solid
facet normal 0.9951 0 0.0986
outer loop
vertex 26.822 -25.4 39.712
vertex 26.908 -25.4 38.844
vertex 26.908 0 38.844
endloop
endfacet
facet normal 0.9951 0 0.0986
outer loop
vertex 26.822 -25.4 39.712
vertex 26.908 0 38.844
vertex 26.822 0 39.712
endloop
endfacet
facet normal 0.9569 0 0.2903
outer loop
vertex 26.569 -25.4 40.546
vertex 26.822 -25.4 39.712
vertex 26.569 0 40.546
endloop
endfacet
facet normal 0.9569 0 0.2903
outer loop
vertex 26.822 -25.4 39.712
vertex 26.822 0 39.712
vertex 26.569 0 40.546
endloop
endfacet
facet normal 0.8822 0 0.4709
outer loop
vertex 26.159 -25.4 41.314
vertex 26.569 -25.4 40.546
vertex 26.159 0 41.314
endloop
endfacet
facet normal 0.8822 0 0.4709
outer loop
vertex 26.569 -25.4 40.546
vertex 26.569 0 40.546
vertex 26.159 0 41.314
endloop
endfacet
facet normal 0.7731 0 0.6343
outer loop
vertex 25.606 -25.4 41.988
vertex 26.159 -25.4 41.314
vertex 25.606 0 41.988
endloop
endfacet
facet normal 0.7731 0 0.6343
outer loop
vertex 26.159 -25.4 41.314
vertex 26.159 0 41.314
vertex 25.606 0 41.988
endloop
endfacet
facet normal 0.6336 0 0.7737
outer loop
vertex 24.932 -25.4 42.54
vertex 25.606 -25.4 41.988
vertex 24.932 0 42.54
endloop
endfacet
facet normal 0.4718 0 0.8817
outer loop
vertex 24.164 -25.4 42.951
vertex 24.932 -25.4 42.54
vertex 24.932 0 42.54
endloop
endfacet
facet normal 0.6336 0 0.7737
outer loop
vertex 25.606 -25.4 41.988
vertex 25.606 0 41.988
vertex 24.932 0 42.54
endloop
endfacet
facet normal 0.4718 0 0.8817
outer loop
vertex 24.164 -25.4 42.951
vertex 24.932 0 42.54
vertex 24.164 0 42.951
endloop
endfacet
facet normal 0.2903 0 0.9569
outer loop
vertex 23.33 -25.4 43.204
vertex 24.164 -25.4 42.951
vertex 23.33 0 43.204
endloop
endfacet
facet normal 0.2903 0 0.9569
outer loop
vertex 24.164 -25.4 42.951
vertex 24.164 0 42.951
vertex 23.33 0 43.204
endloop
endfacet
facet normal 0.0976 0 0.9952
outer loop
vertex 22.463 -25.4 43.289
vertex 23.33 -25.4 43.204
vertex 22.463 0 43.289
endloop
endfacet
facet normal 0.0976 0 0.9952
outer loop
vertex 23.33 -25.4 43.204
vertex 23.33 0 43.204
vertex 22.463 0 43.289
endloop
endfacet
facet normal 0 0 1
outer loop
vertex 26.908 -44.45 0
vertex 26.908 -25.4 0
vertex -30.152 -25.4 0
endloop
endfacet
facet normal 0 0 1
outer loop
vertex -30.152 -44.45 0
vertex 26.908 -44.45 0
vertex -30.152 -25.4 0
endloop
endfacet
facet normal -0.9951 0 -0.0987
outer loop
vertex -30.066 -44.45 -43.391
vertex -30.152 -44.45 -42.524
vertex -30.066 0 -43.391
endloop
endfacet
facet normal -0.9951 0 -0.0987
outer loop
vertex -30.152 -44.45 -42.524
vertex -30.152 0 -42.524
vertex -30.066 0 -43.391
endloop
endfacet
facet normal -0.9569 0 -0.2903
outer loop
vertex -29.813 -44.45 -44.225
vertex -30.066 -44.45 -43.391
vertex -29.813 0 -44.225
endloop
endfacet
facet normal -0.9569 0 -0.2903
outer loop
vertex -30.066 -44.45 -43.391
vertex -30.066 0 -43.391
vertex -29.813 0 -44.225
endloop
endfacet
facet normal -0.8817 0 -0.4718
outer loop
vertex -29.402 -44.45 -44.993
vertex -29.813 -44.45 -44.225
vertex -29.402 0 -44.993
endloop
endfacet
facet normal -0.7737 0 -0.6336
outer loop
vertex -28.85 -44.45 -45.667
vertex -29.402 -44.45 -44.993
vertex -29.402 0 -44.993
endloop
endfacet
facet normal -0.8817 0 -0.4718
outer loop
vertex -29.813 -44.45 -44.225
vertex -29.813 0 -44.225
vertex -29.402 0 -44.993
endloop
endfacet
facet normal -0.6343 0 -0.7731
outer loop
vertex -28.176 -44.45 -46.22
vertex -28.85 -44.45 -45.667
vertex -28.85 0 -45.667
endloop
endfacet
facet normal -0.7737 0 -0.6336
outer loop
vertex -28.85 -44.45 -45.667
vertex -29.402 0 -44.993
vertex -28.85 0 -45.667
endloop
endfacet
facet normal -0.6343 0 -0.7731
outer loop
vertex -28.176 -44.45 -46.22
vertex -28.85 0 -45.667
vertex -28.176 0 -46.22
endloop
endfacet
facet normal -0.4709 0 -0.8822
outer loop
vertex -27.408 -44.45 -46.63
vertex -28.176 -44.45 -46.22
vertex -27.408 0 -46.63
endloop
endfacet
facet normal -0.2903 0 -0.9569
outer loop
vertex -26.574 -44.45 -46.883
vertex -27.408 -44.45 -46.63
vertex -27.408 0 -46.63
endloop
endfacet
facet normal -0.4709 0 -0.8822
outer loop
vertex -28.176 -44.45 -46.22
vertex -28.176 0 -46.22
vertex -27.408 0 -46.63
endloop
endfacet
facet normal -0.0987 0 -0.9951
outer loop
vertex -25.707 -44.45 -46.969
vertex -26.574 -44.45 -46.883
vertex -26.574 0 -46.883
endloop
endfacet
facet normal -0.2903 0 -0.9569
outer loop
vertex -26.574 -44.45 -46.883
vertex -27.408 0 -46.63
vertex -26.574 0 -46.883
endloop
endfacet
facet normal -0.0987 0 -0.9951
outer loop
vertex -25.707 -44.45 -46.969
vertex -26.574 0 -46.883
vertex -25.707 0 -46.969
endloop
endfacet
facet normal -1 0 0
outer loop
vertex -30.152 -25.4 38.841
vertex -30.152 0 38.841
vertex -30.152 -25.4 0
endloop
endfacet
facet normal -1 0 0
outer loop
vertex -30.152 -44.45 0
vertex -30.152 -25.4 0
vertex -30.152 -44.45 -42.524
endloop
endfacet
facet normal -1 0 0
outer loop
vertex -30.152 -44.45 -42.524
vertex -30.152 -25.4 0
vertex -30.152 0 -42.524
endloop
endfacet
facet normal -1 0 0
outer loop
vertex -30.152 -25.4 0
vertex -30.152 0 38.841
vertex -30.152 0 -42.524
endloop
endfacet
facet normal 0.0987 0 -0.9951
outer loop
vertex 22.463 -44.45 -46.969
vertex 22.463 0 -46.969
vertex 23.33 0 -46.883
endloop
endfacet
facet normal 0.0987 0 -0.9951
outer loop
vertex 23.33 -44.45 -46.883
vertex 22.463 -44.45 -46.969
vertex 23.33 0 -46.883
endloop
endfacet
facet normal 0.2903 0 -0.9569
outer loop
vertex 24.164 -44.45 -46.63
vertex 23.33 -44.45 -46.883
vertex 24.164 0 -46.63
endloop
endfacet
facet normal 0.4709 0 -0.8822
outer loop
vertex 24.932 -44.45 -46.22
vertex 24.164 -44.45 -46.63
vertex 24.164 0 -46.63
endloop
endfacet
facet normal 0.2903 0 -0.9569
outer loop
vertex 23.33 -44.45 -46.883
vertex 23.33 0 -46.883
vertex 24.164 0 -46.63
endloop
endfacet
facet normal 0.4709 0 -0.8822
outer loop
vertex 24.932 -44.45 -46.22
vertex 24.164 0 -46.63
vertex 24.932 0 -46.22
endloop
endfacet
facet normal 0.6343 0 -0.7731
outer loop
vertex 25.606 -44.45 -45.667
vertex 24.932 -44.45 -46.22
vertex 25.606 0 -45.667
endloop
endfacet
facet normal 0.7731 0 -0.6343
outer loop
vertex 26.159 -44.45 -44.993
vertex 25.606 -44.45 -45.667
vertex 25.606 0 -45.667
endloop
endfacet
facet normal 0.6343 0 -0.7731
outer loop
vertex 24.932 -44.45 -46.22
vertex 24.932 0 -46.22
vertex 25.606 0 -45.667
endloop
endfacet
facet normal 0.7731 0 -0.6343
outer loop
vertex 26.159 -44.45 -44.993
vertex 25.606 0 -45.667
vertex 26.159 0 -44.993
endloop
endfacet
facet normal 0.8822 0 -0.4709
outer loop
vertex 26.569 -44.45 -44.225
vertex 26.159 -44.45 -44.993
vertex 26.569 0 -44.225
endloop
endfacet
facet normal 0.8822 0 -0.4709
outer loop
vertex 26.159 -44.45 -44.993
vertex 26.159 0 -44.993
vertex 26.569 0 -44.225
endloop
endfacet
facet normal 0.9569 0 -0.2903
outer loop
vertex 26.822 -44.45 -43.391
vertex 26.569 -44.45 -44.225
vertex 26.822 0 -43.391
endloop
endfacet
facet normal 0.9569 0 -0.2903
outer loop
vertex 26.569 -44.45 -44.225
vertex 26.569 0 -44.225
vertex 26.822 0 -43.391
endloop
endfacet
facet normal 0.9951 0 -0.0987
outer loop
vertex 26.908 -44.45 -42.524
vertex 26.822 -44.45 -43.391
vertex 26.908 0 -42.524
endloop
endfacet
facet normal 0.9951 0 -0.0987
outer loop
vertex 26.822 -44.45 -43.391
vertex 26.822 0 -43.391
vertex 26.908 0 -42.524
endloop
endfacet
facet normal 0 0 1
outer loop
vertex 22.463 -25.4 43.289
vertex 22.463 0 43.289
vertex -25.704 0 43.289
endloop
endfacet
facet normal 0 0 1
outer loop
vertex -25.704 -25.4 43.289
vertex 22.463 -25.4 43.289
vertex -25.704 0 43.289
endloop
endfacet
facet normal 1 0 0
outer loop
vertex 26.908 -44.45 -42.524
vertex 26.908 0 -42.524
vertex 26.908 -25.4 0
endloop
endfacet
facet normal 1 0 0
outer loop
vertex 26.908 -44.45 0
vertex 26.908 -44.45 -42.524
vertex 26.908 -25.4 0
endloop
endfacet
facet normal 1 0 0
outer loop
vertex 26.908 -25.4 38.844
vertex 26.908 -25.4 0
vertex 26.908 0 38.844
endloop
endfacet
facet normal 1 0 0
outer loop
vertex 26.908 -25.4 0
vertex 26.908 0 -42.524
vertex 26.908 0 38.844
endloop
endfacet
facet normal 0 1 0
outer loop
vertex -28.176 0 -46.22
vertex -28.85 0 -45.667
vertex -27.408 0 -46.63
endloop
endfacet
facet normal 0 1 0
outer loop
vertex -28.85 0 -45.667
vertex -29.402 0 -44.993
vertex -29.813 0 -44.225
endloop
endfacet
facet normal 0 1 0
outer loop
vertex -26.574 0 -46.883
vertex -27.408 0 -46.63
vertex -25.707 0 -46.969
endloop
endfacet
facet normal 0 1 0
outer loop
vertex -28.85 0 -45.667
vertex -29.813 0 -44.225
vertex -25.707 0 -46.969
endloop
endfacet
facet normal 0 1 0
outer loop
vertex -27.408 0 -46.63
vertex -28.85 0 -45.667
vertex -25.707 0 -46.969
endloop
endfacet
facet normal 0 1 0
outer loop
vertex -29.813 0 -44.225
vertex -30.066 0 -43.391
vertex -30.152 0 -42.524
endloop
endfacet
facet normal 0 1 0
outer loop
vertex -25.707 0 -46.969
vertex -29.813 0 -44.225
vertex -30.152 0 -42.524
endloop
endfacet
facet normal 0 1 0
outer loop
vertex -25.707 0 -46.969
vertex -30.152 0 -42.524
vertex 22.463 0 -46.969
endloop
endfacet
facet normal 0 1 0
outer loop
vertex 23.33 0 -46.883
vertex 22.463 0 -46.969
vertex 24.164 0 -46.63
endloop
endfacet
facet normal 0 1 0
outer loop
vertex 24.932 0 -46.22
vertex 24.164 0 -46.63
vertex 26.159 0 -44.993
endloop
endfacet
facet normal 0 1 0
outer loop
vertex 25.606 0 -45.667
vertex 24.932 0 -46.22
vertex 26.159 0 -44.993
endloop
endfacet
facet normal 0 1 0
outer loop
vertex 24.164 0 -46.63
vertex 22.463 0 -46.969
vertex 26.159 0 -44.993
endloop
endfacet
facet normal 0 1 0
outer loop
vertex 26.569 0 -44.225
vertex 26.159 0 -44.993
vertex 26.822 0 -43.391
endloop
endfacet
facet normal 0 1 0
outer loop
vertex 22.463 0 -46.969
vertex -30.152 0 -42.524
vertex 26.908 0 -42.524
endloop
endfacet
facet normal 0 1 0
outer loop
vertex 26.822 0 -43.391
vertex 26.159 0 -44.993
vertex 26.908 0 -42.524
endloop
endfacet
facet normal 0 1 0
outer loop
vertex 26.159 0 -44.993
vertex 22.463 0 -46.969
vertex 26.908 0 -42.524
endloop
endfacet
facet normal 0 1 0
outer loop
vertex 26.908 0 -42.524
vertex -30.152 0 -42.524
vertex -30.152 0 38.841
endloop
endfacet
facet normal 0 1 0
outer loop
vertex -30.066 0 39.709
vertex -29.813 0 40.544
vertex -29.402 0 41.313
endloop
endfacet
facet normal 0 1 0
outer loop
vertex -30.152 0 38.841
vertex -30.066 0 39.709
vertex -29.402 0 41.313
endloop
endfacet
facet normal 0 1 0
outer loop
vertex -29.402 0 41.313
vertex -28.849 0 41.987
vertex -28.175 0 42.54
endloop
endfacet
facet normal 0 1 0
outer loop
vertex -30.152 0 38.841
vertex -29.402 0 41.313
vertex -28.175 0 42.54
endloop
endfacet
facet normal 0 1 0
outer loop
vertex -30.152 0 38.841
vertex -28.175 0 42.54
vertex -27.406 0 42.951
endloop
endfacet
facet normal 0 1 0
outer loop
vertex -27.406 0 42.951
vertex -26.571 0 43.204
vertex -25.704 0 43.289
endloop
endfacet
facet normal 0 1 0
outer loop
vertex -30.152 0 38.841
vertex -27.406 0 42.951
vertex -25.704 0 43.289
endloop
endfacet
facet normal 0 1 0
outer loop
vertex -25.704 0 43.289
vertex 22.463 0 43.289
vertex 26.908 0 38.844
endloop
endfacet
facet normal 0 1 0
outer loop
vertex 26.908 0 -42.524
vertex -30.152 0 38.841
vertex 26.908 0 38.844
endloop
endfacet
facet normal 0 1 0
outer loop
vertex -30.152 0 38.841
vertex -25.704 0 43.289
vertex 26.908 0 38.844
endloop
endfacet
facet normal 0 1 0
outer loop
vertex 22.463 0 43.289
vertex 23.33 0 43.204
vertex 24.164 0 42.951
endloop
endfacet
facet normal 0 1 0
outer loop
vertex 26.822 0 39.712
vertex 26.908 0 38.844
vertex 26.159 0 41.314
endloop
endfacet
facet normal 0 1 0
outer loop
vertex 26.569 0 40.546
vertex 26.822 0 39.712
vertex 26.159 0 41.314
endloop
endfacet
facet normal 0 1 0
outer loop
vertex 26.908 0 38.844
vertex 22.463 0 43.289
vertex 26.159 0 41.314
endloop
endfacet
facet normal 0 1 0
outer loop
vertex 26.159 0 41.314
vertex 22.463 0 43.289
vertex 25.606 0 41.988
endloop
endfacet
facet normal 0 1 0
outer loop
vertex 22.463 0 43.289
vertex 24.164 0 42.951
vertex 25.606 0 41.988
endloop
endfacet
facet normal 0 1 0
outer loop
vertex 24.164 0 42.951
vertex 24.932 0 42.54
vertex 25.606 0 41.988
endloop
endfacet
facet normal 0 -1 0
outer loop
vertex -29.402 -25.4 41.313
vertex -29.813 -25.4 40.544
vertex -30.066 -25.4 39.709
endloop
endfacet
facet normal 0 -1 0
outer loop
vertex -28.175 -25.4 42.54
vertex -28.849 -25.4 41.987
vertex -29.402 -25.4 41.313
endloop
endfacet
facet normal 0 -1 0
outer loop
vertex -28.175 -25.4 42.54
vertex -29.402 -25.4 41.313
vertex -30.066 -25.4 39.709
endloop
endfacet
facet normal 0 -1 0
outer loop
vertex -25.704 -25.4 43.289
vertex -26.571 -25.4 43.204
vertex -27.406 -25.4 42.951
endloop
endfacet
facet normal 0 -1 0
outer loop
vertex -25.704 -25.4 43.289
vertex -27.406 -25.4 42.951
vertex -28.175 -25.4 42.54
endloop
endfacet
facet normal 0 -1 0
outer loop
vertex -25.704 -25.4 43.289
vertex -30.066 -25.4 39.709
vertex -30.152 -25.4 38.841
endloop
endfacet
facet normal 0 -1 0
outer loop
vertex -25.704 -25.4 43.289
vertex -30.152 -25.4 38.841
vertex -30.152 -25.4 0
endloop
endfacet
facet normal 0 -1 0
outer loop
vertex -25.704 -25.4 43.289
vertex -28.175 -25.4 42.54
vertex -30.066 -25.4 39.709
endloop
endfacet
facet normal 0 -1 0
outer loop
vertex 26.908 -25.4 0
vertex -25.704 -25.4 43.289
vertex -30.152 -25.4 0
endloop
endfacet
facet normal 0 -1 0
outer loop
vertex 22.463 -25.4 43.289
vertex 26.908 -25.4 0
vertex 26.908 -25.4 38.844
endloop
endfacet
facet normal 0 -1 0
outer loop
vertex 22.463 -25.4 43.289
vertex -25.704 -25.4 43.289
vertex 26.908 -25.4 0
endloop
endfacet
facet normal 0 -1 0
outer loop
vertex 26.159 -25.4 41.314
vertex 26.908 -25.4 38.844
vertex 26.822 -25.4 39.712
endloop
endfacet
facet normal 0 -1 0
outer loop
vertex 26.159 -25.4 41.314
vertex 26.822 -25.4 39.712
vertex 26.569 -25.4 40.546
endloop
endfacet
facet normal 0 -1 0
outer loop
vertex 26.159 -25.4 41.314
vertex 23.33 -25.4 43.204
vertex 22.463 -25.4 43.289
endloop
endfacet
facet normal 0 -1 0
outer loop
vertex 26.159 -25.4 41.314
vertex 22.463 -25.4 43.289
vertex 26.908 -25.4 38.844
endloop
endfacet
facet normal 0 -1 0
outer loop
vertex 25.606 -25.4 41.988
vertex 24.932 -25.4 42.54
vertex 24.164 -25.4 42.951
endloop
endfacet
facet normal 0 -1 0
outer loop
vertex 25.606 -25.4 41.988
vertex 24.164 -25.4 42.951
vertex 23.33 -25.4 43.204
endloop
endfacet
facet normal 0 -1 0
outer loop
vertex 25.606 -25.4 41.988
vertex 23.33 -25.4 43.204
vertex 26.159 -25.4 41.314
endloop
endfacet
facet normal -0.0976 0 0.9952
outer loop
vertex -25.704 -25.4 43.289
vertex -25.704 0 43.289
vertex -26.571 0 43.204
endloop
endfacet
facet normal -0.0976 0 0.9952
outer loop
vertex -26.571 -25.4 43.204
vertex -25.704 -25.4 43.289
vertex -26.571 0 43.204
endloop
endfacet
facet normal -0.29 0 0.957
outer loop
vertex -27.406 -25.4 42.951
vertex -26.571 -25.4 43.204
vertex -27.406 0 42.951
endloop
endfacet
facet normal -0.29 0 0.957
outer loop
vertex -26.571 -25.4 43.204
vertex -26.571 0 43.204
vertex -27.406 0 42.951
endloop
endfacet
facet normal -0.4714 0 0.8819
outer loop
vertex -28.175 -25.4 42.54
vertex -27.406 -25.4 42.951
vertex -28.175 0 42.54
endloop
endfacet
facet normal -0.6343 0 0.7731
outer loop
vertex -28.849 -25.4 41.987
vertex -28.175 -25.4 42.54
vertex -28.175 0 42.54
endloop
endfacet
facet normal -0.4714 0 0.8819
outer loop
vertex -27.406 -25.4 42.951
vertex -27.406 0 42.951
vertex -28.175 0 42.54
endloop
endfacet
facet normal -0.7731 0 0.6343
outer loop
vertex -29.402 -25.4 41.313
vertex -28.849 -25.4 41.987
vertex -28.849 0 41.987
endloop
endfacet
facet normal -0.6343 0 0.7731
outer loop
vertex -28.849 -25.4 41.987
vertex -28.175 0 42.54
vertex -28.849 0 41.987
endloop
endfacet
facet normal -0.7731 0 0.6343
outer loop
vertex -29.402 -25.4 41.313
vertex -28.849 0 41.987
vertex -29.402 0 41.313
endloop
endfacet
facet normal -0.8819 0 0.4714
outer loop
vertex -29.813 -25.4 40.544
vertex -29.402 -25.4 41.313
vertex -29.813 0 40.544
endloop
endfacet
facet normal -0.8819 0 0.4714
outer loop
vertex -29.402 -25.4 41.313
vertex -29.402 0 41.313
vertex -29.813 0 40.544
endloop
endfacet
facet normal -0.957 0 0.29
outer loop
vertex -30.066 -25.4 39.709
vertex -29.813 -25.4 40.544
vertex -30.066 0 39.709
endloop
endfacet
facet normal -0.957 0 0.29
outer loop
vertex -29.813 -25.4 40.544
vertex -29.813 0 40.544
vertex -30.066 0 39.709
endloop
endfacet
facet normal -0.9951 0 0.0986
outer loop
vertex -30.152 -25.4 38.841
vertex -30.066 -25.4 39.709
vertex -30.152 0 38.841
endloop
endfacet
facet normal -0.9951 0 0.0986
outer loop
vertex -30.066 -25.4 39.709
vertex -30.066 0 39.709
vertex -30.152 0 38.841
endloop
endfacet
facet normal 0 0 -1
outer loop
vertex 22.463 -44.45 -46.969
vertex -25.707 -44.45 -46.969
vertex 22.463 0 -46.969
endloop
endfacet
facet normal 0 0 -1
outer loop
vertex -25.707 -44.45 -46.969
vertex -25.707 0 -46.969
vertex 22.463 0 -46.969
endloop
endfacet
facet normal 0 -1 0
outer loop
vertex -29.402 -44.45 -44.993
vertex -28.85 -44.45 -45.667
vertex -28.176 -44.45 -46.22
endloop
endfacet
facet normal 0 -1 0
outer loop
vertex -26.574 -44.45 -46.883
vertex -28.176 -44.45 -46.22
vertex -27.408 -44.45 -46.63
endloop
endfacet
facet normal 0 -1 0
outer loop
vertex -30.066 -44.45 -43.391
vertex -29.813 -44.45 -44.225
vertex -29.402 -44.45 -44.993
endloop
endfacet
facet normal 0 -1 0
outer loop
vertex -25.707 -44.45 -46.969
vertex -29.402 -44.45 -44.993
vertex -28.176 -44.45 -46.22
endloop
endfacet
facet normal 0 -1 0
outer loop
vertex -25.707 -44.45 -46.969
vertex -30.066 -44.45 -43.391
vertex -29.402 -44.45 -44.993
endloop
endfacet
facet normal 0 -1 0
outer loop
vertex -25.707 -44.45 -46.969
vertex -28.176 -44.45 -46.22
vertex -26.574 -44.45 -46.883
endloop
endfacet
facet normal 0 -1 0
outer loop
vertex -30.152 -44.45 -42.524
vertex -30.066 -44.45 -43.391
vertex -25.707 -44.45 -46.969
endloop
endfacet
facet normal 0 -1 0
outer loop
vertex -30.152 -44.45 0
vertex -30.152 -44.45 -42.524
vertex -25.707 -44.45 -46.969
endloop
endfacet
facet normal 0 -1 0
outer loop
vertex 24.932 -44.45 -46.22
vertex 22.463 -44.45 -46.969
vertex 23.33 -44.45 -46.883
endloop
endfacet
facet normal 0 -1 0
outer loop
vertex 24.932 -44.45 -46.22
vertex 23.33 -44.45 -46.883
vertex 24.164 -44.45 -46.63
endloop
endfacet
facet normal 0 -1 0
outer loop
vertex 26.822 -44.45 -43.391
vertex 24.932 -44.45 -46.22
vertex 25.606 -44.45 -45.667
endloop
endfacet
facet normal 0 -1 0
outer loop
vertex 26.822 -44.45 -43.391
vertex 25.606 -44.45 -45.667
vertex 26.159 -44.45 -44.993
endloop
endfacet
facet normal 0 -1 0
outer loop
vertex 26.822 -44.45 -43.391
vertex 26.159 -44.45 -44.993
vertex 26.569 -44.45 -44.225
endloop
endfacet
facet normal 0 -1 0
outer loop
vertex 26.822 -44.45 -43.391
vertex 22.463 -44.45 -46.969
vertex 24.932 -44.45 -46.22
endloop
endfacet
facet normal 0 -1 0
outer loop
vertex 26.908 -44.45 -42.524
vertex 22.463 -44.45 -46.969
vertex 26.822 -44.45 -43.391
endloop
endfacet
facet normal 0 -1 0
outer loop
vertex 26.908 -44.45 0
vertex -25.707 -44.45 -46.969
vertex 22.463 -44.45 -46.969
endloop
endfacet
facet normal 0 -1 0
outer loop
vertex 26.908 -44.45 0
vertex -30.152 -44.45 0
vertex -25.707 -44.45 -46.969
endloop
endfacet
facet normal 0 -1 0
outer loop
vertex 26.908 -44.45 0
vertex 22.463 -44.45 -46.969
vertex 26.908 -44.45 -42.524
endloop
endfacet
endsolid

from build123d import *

# Parameters (mm, degrees)
F1_DEPTH = 25.4
F3_DEPTH = 19.05


with BuildPart() as f1:
    # F0 (on Front) → F1 (new body)
    with BuildSketch(Plane.XZ):
        with BuildLine():
            Line((22.462801, 43.289483), (-25.703526, 43.289483))
            ThreePointArc((-25.703526, 43.289483), (-28.848755, 41.986686), (-30.151552, 38.841457))
            Line((-30.151552, 38.841457), (-30.151552, -42.523745))
            ThreePointArc((-30.151552, -42.523745), (-28.849641, -45.666835), (-25.706552, -46.968745))
            Line((-25.706552, -46.968745), (22.462801, -46.968745))
            ThreePointArc((22.462801, -46.968745), (25.605891, -45.666835), (26.907801, -42.523745))
            Line((26.907801, -42.523745), (26.907801, 38.844483))
            ThreePointArc((26.907801, 38.844483), (25.605891, 41.987572), (22.462801, 43.289483))
        make_face()
    extrude(amount=F1_DEPTH)

    # F2 (on face) → F3 (join)
    with BuildSketch(Plane.XZ.offset(25.4)):
        with BuildLine():
            Line((26.907801, 0), (-30.151552, 0))
            Line((-30.151552, 0), (-30.151552, -42.523745))
            ThreePointArc((-30.151552, -42.523745), (-28.849641, -45.666835), (-25.706552, -46.968745))
            Line((-25.706552, -46.968745), (22.462801, -46.968745))
            ThreePointArc((22.462801, -46.968745), (25.605891, -45.666835), (26.907801, -42.523745))
            Line((26.907801, -42.523745), (26.907801, 0))
        make_face()
    extrude(amount=F3_DEPTH)


solid = f1.part
